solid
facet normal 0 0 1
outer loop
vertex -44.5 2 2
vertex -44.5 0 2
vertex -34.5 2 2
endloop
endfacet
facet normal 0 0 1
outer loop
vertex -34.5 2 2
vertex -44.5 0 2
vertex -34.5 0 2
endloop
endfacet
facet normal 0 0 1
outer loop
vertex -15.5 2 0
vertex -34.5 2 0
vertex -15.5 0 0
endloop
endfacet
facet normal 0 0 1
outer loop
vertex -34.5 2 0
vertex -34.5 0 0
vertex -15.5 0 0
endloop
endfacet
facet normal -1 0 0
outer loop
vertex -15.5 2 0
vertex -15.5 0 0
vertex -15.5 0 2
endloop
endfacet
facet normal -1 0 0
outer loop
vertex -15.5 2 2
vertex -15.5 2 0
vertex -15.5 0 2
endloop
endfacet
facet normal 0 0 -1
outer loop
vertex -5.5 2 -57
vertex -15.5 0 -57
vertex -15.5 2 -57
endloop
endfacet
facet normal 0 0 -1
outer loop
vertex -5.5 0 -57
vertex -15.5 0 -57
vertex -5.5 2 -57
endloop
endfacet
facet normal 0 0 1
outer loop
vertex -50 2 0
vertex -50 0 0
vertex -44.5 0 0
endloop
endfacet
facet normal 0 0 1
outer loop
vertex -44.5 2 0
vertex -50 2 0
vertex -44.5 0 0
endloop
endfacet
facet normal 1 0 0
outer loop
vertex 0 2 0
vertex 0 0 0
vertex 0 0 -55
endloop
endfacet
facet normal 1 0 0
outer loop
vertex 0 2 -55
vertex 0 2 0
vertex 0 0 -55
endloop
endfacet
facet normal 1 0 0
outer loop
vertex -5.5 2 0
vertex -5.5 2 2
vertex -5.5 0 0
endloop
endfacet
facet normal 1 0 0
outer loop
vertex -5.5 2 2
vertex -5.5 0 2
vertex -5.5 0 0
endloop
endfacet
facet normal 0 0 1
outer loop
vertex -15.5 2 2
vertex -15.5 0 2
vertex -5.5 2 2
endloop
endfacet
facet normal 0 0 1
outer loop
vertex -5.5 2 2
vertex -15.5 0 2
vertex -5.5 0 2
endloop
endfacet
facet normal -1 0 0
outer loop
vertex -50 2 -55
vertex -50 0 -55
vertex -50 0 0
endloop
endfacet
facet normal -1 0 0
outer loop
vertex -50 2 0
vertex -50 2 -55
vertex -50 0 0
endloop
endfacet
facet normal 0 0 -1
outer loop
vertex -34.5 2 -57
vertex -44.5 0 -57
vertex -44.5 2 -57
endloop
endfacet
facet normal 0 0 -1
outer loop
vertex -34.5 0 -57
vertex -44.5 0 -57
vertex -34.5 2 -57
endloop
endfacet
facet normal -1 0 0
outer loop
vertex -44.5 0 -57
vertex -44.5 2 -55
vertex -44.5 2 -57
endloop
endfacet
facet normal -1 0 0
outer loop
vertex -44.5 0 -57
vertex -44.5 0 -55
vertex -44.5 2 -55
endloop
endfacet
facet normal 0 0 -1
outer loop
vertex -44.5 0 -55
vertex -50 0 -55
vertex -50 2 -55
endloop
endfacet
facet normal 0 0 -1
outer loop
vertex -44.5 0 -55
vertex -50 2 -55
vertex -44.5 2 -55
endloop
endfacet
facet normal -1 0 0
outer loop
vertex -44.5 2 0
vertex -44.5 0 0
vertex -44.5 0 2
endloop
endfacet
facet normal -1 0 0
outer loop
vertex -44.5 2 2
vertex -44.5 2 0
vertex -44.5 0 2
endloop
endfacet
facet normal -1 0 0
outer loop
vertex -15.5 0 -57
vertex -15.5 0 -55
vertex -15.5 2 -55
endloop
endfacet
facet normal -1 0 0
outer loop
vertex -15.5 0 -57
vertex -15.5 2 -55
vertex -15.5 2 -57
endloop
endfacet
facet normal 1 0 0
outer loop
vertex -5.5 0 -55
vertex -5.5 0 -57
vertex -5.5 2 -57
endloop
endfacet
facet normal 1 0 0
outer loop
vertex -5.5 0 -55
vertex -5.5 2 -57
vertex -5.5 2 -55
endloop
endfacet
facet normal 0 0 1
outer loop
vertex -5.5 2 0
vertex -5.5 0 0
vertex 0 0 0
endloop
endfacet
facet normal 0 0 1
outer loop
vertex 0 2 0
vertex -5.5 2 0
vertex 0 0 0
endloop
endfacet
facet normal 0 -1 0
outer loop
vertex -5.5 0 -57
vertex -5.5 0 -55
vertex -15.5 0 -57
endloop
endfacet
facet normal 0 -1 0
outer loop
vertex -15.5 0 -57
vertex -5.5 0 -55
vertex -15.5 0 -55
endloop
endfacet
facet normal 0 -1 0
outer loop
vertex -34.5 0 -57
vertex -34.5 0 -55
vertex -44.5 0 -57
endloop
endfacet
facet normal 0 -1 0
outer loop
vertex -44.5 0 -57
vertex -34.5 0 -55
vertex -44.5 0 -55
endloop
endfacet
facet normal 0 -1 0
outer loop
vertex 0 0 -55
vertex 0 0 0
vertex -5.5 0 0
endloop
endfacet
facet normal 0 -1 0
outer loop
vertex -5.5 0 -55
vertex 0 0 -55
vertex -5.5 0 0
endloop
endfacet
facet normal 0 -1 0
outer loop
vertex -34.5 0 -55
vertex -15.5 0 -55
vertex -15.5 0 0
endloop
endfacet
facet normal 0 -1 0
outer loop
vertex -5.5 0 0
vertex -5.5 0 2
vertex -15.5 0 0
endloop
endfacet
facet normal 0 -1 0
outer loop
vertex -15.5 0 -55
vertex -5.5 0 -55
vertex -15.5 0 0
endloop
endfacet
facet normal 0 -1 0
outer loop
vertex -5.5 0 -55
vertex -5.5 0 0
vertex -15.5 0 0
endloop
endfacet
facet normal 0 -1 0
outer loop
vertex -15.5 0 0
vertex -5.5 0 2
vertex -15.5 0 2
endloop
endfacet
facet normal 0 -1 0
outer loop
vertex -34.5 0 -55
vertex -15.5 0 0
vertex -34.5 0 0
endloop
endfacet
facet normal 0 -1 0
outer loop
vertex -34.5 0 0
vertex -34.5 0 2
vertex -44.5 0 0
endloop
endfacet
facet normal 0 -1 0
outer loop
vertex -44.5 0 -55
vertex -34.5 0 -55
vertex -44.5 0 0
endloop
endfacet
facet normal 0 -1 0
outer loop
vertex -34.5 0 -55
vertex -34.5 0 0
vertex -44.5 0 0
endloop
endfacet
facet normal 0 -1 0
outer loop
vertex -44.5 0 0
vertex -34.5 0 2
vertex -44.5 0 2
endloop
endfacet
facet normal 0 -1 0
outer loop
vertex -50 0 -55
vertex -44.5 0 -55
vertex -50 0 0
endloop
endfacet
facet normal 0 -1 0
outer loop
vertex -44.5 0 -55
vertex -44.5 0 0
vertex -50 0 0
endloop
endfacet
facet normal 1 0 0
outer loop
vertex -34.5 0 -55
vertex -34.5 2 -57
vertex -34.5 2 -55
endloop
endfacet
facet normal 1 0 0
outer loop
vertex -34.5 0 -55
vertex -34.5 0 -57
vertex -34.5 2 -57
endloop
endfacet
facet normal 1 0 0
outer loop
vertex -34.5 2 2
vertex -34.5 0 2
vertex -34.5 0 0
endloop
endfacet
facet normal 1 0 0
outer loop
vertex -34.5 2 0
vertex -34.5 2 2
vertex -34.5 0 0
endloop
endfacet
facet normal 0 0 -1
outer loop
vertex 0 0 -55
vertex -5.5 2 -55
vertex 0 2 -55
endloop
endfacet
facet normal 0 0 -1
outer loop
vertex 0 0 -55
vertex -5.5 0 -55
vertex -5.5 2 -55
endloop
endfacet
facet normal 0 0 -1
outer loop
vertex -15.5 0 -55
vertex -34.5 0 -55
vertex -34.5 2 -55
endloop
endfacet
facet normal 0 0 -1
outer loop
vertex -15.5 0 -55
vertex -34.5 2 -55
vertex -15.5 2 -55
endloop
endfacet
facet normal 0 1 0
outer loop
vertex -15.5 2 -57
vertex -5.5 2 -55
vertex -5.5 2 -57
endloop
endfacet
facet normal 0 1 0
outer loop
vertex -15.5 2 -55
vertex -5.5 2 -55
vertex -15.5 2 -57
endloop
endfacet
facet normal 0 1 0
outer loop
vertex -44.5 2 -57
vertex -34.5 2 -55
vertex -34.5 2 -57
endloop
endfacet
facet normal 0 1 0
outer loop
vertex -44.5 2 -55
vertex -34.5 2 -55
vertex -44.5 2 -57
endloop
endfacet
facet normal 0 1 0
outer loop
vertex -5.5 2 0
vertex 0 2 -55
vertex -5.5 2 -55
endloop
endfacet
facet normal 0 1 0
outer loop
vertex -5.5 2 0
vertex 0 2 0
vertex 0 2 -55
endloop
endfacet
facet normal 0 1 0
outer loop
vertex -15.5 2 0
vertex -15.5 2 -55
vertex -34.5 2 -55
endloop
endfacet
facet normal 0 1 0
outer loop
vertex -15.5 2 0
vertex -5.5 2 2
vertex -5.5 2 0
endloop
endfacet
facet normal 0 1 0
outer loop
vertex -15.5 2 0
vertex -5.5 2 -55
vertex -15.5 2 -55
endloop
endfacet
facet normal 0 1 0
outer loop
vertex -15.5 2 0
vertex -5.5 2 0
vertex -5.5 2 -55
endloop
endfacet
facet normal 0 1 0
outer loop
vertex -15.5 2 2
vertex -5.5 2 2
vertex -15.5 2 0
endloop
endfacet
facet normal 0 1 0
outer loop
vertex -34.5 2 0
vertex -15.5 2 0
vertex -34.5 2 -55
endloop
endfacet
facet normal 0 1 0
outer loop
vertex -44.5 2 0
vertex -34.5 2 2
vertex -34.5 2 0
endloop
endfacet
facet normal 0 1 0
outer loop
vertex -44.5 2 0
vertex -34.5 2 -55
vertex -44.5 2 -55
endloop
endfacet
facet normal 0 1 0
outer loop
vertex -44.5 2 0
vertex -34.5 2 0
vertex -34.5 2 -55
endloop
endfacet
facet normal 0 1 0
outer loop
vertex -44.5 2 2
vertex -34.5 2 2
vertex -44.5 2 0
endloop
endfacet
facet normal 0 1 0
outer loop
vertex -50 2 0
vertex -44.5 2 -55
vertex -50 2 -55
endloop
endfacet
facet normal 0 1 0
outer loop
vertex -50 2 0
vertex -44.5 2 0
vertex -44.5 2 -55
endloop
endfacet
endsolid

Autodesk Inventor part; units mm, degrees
ref_plane "YZ Plane" through (0, 0, 0) normal (1, 0, 0) x (0, 1, 0)
ref_plane "XZ Plane" through (0, 0, 0) normal (0, 1, 0) x (-1, 0, 0)
ref_plane "XY Plane" through (0, 0, 0) normal (0, 0, 1) x (1, 0, 0)
sketch "Sketch1" plane through (0, 0, 0) normal (0, 1, 0) x (-1, 0, 0)
  line L0 (50, 0) -> (44.5, 0)
  line L1 (44.5, 0) -> (44.5, 2)
  line L2 (44.5, 2) -> (34.5, 2)
  line L3 (34.5, 2) -> (34.5, 0)
  line L4 (34.5, 0) -> (15.5, 0)
  line L5 (15.5, 0) -> (15.5, 2)
  line L6 (15.5, 2) -> (5.5, 2)
  line L7 (5.5, 2) -> (5.5, 0)
  line L8 (5.5, 0) -> (0, 0)
  line L9 (0, 0) -> (0, -27.5)
  line L10 (0, -27.5) -> (50, -27.5)
  line L11 (50, -27.5) -> (50, 0)
  line L12 (50, -55) -> (44.5, -55)
  line L13 (44.5, -55) -> (44.5, -57)
  line L14 (44.5, -57) -> (34.5, -57)
  line L15 (34.5, -57) -> (34.5, -55)
  line L16 (34.5, -55) -> (15.5, -55)
  line L17 (15.5, -55) -> (15.5, -57)
  line L18 (15.5, -57) -> (5.5, -57)
  line L19 (5.5, -57) -> (5.5, -55)
  line L20 (5.5, -55) -> (0, -55)
  line L21 (0, -55) -> (0, -27.5)
  line L22 (50, -27.5) -> (50, -55)
  point P0 (0, -55)
  dimension "d1" = 50
  dimension "d2" = 10
  dimension "d3" = 10
  dimension "d4" = 5.5
  dimension "d5" = 5.5
  dimension "d6" = 2
  dimension "d7" = 27.5
extrude "Plate1" add sketch "Sketch1" along normal blind 2
equation "\"d8\" = Thickness"
equation "\"BendRadius\" = Thickness"
equation "\"BendReliefWidth\" = Thickness"
equation "\"BendReliefDepth\" = 0.5 * Thickness"
equation "\"CornerReliefSize\" = 4 * Thickness"
equation "\"MinimumRemnant\" = 2 * Thickness"
equation "\"TransitionRadius\" = BendRadius"
equation "\"JacobiRadiusSize\" = BendRadius"
equation "\"GapSize\" = Thickness"
equation "\"Thickness\" = 2"
properties part number "backstop_beslag"
